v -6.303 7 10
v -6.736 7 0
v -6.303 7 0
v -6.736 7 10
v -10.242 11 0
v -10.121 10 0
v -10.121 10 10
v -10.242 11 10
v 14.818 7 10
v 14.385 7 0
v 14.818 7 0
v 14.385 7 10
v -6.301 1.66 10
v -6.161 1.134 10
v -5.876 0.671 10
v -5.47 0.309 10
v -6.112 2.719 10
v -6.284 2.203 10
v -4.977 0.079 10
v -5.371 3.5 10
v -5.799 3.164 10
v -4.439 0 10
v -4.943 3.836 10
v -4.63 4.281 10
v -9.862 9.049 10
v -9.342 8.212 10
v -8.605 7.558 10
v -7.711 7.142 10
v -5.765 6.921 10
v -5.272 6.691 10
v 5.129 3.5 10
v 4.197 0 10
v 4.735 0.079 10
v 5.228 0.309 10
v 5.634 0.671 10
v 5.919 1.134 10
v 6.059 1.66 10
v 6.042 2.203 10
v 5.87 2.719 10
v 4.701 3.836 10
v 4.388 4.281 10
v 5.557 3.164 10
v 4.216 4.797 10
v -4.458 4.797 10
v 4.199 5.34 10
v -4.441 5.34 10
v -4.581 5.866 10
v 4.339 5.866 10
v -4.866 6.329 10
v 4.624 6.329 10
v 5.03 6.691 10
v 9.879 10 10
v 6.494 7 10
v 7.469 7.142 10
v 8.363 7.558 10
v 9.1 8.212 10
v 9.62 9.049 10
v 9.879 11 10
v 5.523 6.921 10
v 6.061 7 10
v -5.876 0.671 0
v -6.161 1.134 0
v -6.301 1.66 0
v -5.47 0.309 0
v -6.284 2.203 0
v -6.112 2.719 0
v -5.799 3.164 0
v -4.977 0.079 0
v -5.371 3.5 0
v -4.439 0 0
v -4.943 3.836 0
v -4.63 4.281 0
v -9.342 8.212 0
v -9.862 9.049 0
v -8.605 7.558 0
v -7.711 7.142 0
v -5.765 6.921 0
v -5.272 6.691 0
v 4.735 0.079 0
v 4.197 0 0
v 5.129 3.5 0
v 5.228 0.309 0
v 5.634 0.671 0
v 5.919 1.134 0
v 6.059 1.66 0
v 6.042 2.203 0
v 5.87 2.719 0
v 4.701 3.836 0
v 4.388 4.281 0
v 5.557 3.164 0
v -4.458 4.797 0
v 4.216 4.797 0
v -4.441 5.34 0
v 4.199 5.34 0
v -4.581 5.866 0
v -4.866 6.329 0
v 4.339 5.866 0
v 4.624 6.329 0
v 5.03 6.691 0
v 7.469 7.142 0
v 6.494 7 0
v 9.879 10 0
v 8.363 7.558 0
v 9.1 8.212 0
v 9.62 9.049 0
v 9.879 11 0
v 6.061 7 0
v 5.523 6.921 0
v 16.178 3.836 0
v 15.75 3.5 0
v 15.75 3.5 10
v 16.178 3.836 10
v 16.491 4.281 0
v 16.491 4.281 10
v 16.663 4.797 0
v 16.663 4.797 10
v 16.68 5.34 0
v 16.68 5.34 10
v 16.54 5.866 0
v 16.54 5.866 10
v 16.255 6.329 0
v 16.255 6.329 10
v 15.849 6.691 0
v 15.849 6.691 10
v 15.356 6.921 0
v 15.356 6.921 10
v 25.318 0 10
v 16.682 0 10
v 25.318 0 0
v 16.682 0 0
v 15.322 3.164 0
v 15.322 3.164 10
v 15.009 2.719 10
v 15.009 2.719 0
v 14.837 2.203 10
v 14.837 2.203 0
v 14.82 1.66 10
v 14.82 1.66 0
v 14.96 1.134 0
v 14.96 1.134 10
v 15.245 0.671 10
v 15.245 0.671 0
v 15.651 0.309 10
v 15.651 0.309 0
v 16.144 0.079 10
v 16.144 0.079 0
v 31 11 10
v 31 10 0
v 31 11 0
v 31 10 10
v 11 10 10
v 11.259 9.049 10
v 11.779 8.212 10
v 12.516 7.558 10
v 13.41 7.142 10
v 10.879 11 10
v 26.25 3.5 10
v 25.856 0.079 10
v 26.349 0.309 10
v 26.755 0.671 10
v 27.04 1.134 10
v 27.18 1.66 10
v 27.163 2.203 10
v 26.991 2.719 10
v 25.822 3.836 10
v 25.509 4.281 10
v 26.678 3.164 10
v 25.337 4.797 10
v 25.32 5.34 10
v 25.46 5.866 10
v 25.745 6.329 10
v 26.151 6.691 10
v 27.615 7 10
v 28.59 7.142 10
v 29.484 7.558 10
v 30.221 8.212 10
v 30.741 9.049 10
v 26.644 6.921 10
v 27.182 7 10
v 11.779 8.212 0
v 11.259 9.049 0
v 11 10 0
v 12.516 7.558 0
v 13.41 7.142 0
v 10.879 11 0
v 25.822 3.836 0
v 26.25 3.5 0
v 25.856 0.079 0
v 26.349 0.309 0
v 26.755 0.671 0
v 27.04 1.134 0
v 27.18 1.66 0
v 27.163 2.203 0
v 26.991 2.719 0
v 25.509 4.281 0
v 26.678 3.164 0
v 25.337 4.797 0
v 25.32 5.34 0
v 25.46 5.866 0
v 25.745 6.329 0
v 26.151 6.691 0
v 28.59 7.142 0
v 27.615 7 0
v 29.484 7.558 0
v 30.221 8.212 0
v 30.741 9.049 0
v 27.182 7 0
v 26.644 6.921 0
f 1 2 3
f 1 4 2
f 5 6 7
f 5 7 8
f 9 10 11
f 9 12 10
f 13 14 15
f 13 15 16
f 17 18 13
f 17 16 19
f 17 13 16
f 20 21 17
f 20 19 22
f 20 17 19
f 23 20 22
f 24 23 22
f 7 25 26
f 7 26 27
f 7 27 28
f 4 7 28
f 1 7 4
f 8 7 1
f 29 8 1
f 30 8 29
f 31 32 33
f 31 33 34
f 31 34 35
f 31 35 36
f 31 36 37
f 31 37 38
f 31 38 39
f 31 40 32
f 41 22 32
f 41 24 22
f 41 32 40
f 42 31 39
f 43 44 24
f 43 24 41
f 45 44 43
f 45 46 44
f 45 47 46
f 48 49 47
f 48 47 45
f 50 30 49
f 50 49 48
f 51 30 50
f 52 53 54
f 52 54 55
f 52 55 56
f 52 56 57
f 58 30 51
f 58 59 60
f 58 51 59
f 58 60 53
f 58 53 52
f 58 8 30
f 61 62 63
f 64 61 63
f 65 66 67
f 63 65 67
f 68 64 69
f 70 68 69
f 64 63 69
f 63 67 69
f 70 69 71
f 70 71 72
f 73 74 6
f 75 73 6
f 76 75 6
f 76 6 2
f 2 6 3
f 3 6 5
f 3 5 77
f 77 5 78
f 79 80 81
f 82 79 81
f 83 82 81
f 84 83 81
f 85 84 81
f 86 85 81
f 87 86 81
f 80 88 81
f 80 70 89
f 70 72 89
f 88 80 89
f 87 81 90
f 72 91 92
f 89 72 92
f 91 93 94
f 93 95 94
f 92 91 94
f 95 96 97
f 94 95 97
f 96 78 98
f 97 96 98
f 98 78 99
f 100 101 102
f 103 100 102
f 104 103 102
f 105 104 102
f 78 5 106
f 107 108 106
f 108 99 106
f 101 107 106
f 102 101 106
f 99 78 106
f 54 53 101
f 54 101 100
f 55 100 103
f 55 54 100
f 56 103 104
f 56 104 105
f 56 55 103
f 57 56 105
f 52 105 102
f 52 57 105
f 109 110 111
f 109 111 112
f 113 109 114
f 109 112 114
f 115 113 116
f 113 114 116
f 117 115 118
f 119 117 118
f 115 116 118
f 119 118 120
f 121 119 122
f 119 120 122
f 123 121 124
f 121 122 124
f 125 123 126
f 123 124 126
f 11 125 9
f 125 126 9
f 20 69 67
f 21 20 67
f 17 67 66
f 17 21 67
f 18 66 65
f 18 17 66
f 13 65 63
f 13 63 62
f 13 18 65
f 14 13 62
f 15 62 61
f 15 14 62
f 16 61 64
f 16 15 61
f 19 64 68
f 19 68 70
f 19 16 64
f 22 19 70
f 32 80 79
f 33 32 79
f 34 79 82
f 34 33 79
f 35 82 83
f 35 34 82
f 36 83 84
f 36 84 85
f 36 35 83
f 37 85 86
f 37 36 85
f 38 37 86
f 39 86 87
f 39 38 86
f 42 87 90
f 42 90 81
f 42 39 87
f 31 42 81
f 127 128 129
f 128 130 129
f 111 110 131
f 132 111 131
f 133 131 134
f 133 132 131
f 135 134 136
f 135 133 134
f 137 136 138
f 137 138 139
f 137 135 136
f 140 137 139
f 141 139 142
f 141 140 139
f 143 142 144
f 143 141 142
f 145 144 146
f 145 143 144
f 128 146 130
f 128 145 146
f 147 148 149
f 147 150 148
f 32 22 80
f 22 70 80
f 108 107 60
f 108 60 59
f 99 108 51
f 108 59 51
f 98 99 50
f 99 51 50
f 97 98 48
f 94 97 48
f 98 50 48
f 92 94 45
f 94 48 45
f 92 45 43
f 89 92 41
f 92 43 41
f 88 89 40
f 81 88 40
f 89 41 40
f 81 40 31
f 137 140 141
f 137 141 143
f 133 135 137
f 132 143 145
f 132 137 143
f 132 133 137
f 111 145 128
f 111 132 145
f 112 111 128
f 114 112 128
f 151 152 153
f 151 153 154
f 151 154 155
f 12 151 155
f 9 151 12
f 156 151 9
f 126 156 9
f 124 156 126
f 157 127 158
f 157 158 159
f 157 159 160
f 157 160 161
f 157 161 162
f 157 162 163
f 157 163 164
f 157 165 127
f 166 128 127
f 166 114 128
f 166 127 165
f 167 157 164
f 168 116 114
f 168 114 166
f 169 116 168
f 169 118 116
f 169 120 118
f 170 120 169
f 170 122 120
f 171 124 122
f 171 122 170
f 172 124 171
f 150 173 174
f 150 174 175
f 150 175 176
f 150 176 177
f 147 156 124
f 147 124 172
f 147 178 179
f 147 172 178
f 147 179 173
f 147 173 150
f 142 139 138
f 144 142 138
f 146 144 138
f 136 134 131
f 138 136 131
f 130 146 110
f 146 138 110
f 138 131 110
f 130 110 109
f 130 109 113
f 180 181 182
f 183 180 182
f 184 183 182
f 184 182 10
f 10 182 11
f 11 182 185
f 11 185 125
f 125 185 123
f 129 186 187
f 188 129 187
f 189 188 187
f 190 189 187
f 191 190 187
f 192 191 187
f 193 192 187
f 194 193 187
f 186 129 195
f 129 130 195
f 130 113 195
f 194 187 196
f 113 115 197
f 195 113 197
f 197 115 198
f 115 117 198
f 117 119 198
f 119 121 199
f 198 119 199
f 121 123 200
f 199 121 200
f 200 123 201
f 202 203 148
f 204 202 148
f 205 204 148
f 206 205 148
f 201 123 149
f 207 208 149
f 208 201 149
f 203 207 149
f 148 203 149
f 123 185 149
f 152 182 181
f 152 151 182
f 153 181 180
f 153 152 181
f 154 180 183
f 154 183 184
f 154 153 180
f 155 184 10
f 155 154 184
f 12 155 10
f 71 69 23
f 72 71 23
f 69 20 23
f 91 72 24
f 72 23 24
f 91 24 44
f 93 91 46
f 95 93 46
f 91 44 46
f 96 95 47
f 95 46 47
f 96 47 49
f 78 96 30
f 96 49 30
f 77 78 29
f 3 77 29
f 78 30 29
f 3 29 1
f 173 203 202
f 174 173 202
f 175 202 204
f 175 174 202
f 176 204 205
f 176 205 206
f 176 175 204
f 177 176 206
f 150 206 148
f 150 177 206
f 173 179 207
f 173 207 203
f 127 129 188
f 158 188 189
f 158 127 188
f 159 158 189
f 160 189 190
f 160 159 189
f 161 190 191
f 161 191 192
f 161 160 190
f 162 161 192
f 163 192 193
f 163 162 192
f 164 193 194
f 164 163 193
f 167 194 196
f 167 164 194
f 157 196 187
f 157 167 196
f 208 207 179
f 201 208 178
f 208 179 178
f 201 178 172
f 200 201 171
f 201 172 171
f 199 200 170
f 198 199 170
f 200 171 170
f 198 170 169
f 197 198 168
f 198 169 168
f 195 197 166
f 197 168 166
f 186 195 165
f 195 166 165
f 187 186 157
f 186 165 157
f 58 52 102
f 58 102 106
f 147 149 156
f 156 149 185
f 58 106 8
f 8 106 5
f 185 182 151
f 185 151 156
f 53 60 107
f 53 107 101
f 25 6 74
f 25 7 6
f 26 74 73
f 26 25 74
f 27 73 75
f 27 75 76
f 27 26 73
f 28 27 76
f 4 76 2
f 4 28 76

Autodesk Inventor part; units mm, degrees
ref_plane "YZ Plane" through (0, 0, 0) normal (1, 0, 0) x (0, 1, 0)
ref_plane "XZ Plane" through (0, 0, 0) normal (0, 1, 0) x (-1, 0, 0)
ref_plane "XY Plane" through (0, 0, 0) normal (0, 0, 1) x (1, 0, 0)
sketch "Sketch1" plane through (0, 0, 0) normal (0, 0, 1) x (1, 0, 0)
  line L0 (0, 0) -> (21, 0)
  line L1 (21, 0) -> (21, 11)
  line L2 (21, 11) -> (0, 11)
  line L3 (0, 11) -> (0, 0)
  dimension "d0" = 21
  dimension "d1" = 11
extrude "Extrusion1" add sketch "Sketch1" along normal blind 10
sketch "Sketch2" plane through (0, 0, 10) normal (0, 0, 1) x (1, 0, 0)
  line L0 (0, 0) -> (21, 0) projected
  arc A0 (4.3181, 0) -> (5.25, 3.5) centre (4.3181, 1.8741) ccw
  arc A1 (6.1819, 7) -> (5.25, 3.5) centre (6.1819, 5.1259) ccw
  arc A2 (15.75, 3.5) -> (16.6819, 0) centre (16.6819, 1.8741) ccw
  arc A3 (15.75, 3.5) -> (14.8181, 7) centre (14.8181, 5.1259) ccw
  line L1 (6.1819, 7) -> (14.8181, 7)
  line L2 (21, 11) -> (0, 11) projected
  line L3 (4.3181, 1.8741) -> (6.1819, 5.1259) construction
  line L4 (16.6819, 1.8741) -> (14.8181, 5.1259) construction
  line L5 (0, 11) -> (0, 0) construction
  line L6 (21, 0) -> (21, 11) construction
  point P0 (10.5, 7)
  point P1 (15.75, 3.5)
  dimension "d7" = 10.5
  dimension "d9" = 7
  dimension "d13" = 10.5
extrude "Extrusion2" cut sketch "Sketch2" against normal through all
sketch "Sketch3" plane through (0, 0, 10) normal (0, 0, 1) x (1, 0, 0)
  line L0 (21, 11) -> (0, 11) projected
  line L1 (14.8181, 7) -> (6.1819, 7) projected
  arc A0 (6.6147, 7) -> (10, 10) centre (6.6147, 10.41) ccw
  arc A1 (11, 10) -> (14.3853, 7) centre (14.3853, 10.41) ccw
  line L2 (10, 10) -> (11, 10)
  line L3 (6.1819, 7) -> (14.8181, 7) projected
  line L4 (10.5, 10) -> (10.5, 11) construction
  point P0 (0, 0)
  dimension "d15" = 1
  dimension "d16" = 1
extrude "Extrusion3" cut sketch "Sketch3" against normal through all
pattern_linear "Rectangular Pattern1" count 6 spacing 21 along (1, 0, 0)
sketch "Sketch4" plane through (0, 0, 10) normal (0, 0, 1) x (1, 0, 0)
  line L0 (115, 10) -> (116, 10) projected
  line L1 (115, 10) -> (115, 11)
  line L2 (126, 11) -> (0, 11) projected
  line L3 (121.6819, 0) -> (126, 0) projected
  line L4 (121.6819, 0) -> (126, 0)
  line L5 (126, 0) -> (126, 11)
  line L6 (126, 0) -> (126, 11) projected
  line L7 (126, 11) -> (115, 11)
  arc A0 (116, 10) -> (119.3853, 7) centre (119.3853, 10.41) ccw projected
  line L8 (115, 10) -> (116, 10)
  line L9 (119.3853, 7) -> (119.8181, 7) projected
  arc A1 (116, 10) -> (119.3853, 7) centre (119.3853, 10.41) ccw
  arc A2 (120.75, 3.5) -> (119.8181, 7) centre (119.8181, 5.1259) ccw projected
  line L10 (119.3853, 7) -> (119.8181, 7)
  arc A3 (120.75, 3.5) -> (119.8181, 7) centre (119.8181, 5.1259) ccw
  arc A4 (120.75, 3.5) -> (121.6819, 0) centre (121.6819, 1.8741) ccw projected
  arc A5 (120.75, 3.5) -> (121.6819, 0) centre (121.6819, 1.8741) ccw
  line L11 (32, 10) -> (31, 10) projected
  line L12 (31, 10) -> (31, 11)
  line L13 (31, 10) -> (31, 0)
  line L14 (31, 0) -> (126, 0)
  line L15 (126, 11) -> (31, 11)
  arc A6 (11, 10) -> (14.3853, 7) centre (14.3853, 10.41) ccw projected
  line L16 (11, 10) -> (10.8789, 11)
  line L17 (10.8789, 11) -> (0, 11)
  line L18 (0, 11) -> (0, 0)
  line L19 (0, 0) -> (11, 0)
  line L20 (11, 0) -> (11, 10)
  point P0 (11, 11)
extrude "Extrusion4" cut sketch "Sketch4" against normal through all
pattern_linear "Rectangular Pattern2" count 2 spacing 21.121 along (-1, 0, 0)
sketch "Sketch5" plane through (0, 0, 10) normal (0, 0, 1) x (1, 0, 0)
  line L0 (31, 11) -> (10.8789, 11) projected
  line L1 (15.75, 3.5) -> (11.9442, 10.1401) construction
  arc A0 (15.75, 3.5) -> (16.6819, 0) centre (16.6819, 1.8741) ccw construction
  line L2 (11.7707, 1.2193) -> (15.75, 3.5) construction
  arc A1 (15.75, 3.5) -> (14.8181, 7) centre (14.8181, 5.1259) ccw construction
  line L3 (15.75, 3.5) -> (19.849, 5.8494) construction
  arc A2 (25.3181, 0) -> (26.25, 3.5) centre (25.3181, 1.8741) ccw construction
  line L4 (26.25, 3.5) -> (29.888, 9.8474) construction
  line L5 (23.4673, 5.0949) -> (26.25, 3.5) construction
  line L6 (26.25, 3.5) -> (28.9514, 1.9517) construction
  arc A3 (25.3181, 0) -> (26.25, 3.5) centre (25.3181, 1.8741) ccw construction
  line L7 (11.9442, 10.1401) -> (8.4243, 16.2814) construction
  line L8 (29.888, 9.8474) -> (33.5756, 16.2813) construction
  line L9 (21.2593, -5.2075) -> (20.7407, -6.1122) construction
  line L10 (-11.2522, 13.7611) -> (-5.371, 3.5) construction
  line L11 (-9.2047, 1.3027) -> (-5.371, 3.5) construction
  line L12 (-5.371, 3.5) -> (-0.1045, 6.5185) construction
  line L13 (5.129, 3.5) -> (8.7239, 1.4396) construction
  line L14 (5.129, 3.5) -> (-0.283, 6.6019) construction
  arc A4 (4.1971, 0) -> (5.129, 3.5) centre (4.1971, 1.8741) ccw construction
  arc A5 (-5.371, 3.5) -> (-6.3029, 7) centre (-6.3029, 5.1259) ccw construction
  arc A6 (-5.371, 3.5) -> (-4.4391, 0) centre (-4.4391, 1.8741) ccw construction
  arc A7 (6.0609, 7) -> (5.129, 3.5) centre (6.0609, 5.1259) ccw construction
  arc A8 (4.1971, 0) -> (5.129, 3.5) centre (4.1971, 1.8741) ccw construction
  line L15 (5.129, 3.5) -> (13.9975, 18.9732) construction
  arc A9 (15.75, 3.5) -> (16.6819, 0) centre (16.6819, 1.8741) ccw construction
  arc A10 (15.75, 3.5) -> (14.8181, 7) centre (14.8181, 5.1259) ccw construction
  arc A11 (27.1819, 7) -> (26.25, 3.5) centre (27.1819, 5.1259) ccw construction
  point P0 (0, 0)
  point P1 (8.9348, 10.1401)
  point P2 (-9.1768, 10.1401)
properties part number "Zipperteethv4"
